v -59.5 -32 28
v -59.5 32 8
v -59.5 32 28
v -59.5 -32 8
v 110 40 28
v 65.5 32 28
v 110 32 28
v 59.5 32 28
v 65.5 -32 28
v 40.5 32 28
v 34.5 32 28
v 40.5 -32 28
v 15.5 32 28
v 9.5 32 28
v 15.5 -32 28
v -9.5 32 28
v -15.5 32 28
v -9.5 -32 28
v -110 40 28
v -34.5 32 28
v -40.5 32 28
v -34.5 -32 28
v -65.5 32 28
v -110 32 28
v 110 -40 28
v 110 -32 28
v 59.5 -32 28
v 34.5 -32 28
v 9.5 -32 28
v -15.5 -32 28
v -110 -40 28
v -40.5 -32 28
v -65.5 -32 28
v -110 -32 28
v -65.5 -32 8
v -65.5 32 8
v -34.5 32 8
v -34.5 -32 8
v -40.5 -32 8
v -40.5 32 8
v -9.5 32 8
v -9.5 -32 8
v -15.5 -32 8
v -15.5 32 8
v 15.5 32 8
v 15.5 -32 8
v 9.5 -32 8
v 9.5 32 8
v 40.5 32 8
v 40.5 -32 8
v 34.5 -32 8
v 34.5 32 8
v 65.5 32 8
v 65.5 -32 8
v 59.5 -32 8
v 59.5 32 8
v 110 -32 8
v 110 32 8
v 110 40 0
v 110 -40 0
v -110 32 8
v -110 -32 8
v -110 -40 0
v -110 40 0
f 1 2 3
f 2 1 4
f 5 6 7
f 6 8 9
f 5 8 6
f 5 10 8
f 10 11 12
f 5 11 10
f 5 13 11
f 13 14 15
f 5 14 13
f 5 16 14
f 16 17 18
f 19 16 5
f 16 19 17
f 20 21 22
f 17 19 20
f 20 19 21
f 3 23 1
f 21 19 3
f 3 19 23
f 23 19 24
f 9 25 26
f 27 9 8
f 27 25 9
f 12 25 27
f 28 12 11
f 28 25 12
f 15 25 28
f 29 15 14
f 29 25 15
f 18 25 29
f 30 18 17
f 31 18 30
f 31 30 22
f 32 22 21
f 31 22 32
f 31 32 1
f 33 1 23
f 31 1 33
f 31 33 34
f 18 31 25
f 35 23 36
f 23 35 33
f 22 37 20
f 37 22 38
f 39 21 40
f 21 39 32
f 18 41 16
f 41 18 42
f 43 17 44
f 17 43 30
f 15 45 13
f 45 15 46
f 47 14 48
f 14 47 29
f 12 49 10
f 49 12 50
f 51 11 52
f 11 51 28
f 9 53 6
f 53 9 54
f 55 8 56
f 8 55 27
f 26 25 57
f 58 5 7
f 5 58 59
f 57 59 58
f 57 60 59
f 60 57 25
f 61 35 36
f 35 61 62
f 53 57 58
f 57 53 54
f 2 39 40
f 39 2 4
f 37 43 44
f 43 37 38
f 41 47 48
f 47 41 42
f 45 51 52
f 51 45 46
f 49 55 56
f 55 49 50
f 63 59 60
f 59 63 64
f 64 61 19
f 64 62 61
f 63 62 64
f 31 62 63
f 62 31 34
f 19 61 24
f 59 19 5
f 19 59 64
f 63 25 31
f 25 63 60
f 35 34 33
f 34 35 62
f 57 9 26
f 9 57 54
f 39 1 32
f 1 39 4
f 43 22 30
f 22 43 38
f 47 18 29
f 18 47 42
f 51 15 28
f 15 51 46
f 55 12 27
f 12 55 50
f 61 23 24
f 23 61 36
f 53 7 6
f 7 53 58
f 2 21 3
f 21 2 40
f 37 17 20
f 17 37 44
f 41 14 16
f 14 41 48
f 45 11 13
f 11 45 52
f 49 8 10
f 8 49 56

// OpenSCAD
$fn = 32;

// ----------------------------------------------------------------------
// Rib frame 220 x 80 x 28
// 6 ribs at 25 mm pitch
// ----------------------------------------------------------------------

// --- parameters (mm) ---
frame = [220, 80, 8];  // base plate size (x, y, z)
rail_w = 8;            // side rail width
ribs = 6;              // number of ribs
rib_t = 6;             // rib thickness
rib_h = 20;            // rib height above the base plate
pitch = 25;            // pitch between rib centres

// --- derived feature positions (mm) ---
span = (ribs - 1) * pitch;          // = 125   distance between the outer ribs
origin_x = -span / 2;               // = -62.5   X of the first rib
rib_len = frame[1] - 2 * rail_w + 2;  // = 66   rib length, 1 mm into each rail
feature_centers = [
  [origin_x + 0 * pitch, 0],
  [origin_x + 1 * pitch, 0],
  [origin_x + 2 * pitch, 0],
  [origin_x + 3 * pitch, 0],
  [origin_x + 4 * pitch, 0],
  [origin_x + 5 * pitch, 0]
];   // rib centre line, drives the rib loop

// base plate, two side rails, then the ribs read straight off feature_centers
union() {
  translate([-frame[0] / 2, -frame[1] / 2, 0]) cube(frame);
  translate([-frame[0] / 2, -frame[1] / 2, 0]) cube([frame[0], rail_w, frame[2] + rib_h]);
  translate([-frame[0] / 2, frame[1] / 2 - rail_w, 0]) cube([frame[0], rail_w, frame[2] + rib_h]);
  for (centre = feature_centers)
    translate([centre[0] - rib_t / 2, centre[1] - rib_len / 2, frame[2] - 1])
      cube([rib_t, rib_len, rib_h + 1]);
}
